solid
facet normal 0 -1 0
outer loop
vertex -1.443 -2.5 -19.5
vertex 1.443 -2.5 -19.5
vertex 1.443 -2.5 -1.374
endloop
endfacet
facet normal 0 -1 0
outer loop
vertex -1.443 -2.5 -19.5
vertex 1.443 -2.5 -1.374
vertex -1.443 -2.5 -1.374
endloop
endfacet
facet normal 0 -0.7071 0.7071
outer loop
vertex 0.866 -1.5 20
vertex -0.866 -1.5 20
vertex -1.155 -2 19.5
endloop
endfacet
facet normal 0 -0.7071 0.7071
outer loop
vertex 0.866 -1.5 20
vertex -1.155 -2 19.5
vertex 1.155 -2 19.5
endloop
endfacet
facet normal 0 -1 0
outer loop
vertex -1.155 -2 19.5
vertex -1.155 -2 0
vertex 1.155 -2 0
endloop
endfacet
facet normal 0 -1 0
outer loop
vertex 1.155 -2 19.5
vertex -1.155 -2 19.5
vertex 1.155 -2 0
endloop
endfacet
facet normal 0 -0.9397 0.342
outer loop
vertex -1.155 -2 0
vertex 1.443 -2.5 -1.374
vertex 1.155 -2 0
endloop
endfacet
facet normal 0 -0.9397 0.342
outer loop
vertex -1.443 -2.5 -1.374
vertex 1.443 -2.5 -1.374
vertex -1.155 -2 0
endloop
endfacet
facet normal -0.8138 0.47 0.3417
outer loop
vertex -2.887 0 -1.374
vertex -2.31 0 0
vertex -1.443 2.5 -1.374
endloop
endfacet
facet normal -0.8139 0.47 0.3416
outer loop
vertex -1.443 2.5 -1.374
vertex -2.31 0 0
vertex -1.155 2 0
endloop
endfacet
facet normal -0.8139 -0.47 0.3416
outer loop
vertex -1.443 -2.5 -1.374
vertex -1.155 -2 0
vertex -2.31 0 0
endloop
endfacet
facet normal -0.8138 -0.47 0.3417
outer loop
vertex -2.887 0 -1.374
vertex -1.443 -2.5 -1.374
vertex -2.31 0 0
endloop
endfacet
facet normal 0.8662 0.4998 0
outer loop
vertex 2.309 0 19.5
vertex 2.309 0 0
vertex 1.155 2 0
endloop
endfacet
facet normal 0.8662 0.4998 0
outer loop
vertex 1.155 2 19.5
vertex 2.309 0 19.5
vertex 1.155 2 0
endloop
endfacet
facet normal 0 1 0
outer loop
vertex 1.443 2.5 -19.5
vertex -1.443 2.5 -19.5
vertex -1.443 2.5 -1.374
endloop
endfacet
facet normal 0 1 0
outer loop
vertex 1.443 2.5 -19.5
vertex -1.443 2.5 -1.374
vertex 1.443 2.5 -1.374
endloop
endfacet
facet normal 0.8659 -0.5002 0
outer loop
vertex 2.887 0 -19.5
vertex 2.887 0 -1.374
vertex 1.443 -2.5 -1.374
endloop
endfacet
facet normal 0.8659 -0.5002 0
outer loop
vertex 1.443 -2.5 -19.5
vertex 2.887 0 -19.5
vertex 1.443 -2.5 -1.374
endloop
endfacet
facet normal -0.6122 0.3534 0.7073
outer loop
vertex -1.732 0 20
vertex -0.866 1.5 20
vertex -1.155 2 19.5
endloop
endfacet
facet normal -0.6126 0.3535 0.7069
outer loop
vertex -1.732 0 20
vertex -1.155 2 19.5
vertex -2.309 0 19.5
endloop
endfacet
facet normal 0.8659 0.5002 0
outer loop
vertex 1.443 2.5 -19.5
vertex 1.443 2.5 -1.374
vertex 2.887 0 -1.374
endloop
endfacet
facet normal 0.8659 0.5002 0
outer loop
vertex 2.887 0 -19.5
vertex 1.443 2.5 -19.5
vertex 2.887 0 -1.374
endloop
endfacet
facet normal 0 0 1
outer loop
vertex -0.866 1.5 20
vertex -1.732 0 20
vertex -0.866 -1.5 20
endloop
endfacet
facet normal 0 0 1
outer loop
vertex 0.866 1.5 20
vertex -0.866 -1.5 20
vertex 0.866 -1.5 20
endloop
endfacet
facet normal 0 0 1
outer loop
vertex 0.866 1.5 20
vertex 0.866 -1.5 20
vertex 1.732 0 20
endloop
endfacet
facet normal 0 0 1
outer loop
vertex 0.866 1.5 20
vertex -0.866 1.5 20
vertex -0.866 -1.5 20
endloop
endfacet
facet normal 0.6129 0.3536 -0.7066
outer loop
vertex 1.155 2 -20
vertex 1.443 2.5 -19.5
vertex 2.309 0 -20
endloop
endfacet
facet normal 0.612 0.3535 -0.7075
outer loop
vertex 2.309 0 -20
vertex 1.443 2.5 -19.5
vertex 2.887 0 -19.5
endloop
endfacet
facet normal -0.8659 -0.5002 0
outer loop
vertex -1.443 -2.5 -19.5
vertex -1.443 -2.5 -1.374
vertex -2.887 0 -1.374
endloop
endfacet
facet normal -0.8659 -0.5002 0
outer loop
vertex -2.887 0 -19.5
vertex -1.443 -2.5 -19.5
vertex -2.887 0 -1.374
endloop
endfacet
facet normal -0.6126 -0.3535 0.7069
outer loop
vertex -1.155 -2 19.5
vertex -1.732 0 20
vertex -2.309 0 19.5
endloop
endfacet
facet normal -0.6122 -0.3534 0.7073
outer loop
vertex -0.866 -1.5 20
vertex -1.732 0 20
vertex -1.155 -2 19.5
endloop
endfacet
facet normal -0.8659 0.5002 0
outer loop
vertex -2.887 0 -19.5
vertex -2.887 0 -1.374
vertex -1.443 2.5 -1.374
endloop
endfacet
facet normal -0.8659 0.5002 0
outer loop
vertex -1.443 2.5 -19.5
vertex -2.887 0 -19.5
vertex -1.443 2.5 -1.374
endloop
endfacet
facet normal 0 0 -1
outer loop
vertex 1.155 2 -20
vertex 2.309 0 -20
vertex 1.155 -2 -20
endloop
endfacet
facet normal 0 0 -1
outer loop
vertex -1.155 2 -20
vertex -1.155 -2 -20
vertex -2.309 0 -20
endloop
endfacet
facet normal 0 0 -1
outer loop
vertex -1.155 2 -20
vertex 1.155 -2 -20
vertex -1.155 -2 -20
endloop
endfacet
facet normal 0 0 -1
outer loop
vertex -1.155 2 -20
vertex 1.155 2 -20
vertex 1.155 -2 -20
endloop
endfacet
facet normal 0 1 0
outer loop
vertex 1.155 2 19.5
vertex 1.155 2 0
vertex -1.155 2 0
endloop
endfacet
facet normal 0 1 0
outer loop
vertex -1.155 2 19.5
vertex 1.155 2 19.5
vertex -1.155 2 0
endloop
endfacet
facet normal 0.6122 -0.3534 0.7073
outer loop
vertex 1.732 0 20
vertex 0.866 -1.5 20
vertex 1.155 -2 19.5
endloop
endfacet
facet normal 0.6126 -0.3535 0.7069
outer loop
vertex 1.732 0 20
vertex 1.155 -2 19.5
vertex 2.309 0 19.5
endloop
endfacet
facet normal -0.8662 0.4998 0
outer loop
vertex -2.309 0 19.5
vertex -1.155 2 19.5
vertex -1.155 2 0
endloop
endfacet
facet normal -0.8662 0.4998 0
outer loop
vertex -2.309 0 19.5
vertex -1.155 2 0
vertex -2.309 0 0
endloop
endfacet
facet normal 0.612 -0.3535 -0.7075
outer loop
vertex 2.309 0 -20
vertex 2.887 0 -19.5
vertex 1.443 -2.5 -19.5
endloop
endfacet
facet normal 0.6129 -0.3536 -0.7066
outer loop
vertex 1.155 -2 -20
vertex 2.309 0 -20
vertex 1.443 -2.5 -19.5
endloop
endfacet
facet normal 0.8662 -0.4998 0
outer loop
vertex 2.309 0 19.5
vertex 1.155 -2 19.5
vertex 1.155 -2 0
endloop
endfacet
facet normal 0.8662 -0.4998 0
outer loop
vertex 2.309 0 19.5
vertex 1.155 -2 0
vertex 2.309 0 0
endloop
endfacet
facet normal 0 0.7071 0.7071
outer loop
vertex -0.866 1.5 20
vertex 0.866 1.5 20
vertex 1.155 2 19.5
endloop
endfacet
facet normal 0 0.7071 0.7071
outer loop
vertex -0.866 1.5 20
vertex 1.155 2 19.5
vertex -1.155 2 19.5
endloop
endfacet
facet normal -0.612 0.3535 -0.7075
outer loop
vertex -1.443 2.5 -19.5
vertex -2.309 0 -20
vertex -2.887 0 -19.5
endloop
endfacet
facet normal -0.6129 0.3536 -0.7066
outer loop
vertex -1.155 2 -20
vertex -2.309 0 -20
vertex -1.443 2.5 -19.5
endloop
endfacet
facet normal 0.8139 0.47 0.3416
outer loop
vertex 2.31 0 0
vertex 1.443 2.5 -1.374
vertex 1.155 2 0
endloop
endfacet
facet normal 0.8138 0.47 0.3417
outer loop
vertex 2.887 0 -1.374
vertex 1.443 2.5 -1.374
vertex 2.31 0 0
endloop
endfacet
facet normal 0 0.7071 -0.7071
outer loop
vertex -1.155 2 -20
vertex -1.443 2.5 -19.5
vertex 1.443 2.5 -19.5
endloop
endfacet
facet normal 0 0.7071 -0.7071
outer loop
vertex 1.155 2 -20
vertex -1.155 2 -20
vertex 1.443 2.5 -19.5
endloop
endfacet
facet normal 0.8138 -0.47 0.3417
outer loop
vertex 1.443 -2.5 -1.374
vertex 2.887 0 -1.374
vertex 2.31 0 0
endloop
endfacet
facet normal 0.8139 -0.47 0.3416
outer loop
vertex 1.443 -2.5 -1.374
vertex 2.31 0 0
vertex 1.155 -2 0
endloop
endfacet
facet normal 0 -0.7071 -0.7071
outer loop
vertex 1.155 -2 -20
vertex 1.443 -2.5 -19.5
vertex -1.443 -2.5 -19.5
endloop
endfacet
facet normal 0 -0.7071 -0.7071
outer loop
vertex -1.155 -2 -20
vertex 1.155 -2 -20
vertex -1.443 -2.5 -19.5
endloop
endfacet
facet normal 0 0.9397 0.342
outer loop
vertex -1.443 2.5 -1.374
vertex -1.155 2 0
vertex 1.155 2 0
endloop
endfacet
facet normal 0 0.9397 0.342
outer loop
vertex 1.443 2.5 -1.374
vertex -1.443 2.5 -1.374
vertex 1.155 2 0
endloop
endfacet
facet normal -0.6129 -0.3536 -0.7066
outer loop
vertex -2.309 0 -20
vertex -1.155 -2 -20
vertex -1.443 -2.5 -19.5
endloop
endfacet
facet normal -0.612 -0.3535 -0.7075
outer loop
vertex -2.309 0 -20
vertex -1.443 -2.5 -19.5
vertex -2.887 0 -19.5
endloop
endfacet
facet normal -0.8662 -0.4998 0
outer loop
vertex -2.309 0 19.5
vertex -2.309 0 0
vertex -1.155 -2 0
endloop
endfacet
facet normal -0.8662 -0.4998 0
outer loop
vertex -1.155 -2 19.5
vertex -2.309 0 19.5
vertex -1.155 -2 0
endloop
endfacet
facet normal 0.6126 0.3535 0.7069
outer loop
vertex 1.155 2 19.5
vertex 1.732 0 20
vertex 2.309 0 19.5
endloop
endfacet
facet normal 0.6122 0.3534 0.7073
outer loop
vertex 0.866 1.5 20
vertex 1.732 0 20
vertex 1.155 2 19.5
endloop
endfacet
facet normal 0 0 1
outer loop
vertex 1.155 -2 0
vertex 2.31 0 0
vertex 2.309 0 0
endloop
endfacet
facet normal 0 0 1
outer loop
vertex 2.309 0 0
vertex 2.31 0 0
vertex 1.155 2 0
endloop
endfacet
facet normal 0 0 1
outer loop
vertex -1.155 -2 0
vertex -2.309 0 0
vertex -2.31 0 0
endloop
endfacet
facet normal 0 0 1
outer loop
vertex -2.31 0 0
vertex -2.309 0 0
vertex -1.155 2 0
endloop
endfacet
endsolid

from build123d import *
from OCP.BRepFilletAPI import BRepFilletAPI_MakeChamfer

# Parameters (mm, degrees)
EXTRUDE_1_DEPTH  = 20
CHAMFER_1_SIZE   = 0.5
EXTRUDE_2_DEPTH  = 20
CHAMFER_3_SIZE   = 1.37373871
CHAMFER_3_SIZE_2 = 0.5
CHAMFER_4_SIZE   = 0.5


with BuildPart() as part:
    # 草图1 → 凸台-拉伸1 (new body)
    with BuildSketch(Plane.XY):
        Polygon((2.309401077, 0), (1.154700538, 2), (-1.154700538, 2), (-2.309401077, 0), (-1.154700538, -2), (1.154700538, -2), align=None)
    extrude(amount=EXTRUDE_1_DEPTH)

    # 倒角1
    chamfer_1_edges = [part.edges().sort_by_distance(p)[0] for p in [
        (0, 2, 20),
        (-1.732050808, 1, 20),
        (-1.732050808, -1, 20),
        (0, -2, 20),
        (1.732050808, -1, 20),
        (1.732050808, 1, 20),
    ]]
    chamfer(chamfer_1_edges, length=CHAMFER_1_SIZE)

    # 草图2 → 凸台-拉伸2 (add)
    with BuildSketch(Plane(origin=(0, 0, 0), x_dir=(-1, 0, 0), z_dir=(0, 0, -1))):
        Polygon((2.886751346, 0), (1.443375673, 2.5), (-1.443375673, 2.5), (-2.886751346, 0), (-1.443375673, -2.5), (1.443375673, -2.5), align=None)
    extrude(amount=EXTRUDE_2_DEPTH)

    # 倒角3
    chamfer_3_edges_1 = [part.edges().sort_by_distance(p)[0] for p in [
        (-2.165063509, -1.25, 0),
    ]]
    chamfer_3_side_1 = [part.faces().sort_by_distance(p)[0] for p in [
        (-2.165063509, -1.25, -0.01),
    ]]
    chamfer_3_edges_2 = [part.edges().sort_by_distance(p)[0] for p in [
        (-2.165063509, 1.25, 0),
    ]]
    chamfer_3_side_2 = [part.faces().sort_by_distance(p)[0] for p in [
        (-2.165063509, 1.25, -0.01),
    ]]
    chamfer_3_edges_3 = [part.edges().sort_by_distance(p)[0] for p in [
        (0, 2.5, 0),
    ]]
    chamfer_3_side_3 = [part.faces().sort_by_distance(p)[0] for p in [
        (0, 2.5, -0.01),
    ]]
    chamfer_3_edges_4 = [part.edges().sort_by_distance(p)[0] for p in [
        (2.165063509, 1.25, 0),
    ]]
    chamfer_3_side_4 = [part.faces().sort_by_distance(p)[0] for p in [
        (2.156403255, 1.245, 0),
    ]]
    chamfer_3_edges_5 = [part.edges().sort_by_distance(p)[0] for p in [
        (2.165063509, -1.25, 0),
    ]]
    chamfer_3_side_5 = [part.faces().sort_by_distance(p)[0] for p in [
        (2.156403255, -1.245, 0),
    ]]
    chamfer_3_edges_6 = [part.edges().sort_by_distance(p)[0] for p in [
        (0, -2.5, 0),
    ]]
    chamfer_3_side_6 = [part.faces().sort_by_distance(p)[0] for p in [
        (0, -2.49, 0),
    ]]
    chamfer_3 = BRepFilletAPI_MakeChamfer(part.part.solid().wrapped)
    for e in chamfer_3_edges_1:
        chamfer_3.Add(CHAMFER_3_SIZE - 0.0001, CHAMFER_3_SIZE_2 - 0.0001, e.wrapped, chamfer_3_side_1[0].wrapped)
    for e in chamfer_3_edges_2:
        chamfer_3.Add(CHAMFER_3_SIZE - 0.0001, CHAMFER_3_SIZE_2 - 0.0001, e.wrapped, chamfer_3_side_2[0].wrapped)
    for e in chamfer_3_edges_3:
        chamfer_3.Add(CHAMFER_3_SIZE - 0.0001, CHAMFER_3_SIZE_2 - 0.0001, e.wrapped, chamfer_3_side_3[0].wrapped)
    for e in chamfer_3_edges_4:
        chamfer_3.Add(CHAMFER_3_SIZE_2 - 0.0001, CHAMFER_3_SIZE - 0.0001, e.wrapped, chamfer_3_side_4[0].wrapped)
    for e in chamfer_3_edges_5:
        chamfer_3.Add(CHAMFER_3_SIZE_2 - 0.0001, CHAMFER_3_SIZE - 0.0001, e.wrapped, chamfer_3_side_5[0].wrapped)
    for e in chamfer_3_edges_6:
        chamfer_3.Add(CHAMFER_3_SIZE_2 - 0.0001, CHAMFER_3_SIZE - 0.0001, e.wrapped, chamfer_3_side_6[0].wrapped)
    add(Compound.cast(chamfer_3.Shape()), mode=Mode.REPLACE)  # a hair under: the kernel refuses the full size

    # 倒角4
    chamfer_4_edges = [part.edges().sort_by_distance(p)[0] for p in [
        (-2.165063509, -1.25, -20),
        (-2.165063509, 1.25, -20),
        (0, 2.5, -20),
        (2.165063509, 1.25, -20),
        (2.165063509, -1.25, -20),
        (0, -2.5, -20),
    ]]
    chamfer(chamfer_4_edges, length=CHAMFER_4_SIZE)


solid = part.part
